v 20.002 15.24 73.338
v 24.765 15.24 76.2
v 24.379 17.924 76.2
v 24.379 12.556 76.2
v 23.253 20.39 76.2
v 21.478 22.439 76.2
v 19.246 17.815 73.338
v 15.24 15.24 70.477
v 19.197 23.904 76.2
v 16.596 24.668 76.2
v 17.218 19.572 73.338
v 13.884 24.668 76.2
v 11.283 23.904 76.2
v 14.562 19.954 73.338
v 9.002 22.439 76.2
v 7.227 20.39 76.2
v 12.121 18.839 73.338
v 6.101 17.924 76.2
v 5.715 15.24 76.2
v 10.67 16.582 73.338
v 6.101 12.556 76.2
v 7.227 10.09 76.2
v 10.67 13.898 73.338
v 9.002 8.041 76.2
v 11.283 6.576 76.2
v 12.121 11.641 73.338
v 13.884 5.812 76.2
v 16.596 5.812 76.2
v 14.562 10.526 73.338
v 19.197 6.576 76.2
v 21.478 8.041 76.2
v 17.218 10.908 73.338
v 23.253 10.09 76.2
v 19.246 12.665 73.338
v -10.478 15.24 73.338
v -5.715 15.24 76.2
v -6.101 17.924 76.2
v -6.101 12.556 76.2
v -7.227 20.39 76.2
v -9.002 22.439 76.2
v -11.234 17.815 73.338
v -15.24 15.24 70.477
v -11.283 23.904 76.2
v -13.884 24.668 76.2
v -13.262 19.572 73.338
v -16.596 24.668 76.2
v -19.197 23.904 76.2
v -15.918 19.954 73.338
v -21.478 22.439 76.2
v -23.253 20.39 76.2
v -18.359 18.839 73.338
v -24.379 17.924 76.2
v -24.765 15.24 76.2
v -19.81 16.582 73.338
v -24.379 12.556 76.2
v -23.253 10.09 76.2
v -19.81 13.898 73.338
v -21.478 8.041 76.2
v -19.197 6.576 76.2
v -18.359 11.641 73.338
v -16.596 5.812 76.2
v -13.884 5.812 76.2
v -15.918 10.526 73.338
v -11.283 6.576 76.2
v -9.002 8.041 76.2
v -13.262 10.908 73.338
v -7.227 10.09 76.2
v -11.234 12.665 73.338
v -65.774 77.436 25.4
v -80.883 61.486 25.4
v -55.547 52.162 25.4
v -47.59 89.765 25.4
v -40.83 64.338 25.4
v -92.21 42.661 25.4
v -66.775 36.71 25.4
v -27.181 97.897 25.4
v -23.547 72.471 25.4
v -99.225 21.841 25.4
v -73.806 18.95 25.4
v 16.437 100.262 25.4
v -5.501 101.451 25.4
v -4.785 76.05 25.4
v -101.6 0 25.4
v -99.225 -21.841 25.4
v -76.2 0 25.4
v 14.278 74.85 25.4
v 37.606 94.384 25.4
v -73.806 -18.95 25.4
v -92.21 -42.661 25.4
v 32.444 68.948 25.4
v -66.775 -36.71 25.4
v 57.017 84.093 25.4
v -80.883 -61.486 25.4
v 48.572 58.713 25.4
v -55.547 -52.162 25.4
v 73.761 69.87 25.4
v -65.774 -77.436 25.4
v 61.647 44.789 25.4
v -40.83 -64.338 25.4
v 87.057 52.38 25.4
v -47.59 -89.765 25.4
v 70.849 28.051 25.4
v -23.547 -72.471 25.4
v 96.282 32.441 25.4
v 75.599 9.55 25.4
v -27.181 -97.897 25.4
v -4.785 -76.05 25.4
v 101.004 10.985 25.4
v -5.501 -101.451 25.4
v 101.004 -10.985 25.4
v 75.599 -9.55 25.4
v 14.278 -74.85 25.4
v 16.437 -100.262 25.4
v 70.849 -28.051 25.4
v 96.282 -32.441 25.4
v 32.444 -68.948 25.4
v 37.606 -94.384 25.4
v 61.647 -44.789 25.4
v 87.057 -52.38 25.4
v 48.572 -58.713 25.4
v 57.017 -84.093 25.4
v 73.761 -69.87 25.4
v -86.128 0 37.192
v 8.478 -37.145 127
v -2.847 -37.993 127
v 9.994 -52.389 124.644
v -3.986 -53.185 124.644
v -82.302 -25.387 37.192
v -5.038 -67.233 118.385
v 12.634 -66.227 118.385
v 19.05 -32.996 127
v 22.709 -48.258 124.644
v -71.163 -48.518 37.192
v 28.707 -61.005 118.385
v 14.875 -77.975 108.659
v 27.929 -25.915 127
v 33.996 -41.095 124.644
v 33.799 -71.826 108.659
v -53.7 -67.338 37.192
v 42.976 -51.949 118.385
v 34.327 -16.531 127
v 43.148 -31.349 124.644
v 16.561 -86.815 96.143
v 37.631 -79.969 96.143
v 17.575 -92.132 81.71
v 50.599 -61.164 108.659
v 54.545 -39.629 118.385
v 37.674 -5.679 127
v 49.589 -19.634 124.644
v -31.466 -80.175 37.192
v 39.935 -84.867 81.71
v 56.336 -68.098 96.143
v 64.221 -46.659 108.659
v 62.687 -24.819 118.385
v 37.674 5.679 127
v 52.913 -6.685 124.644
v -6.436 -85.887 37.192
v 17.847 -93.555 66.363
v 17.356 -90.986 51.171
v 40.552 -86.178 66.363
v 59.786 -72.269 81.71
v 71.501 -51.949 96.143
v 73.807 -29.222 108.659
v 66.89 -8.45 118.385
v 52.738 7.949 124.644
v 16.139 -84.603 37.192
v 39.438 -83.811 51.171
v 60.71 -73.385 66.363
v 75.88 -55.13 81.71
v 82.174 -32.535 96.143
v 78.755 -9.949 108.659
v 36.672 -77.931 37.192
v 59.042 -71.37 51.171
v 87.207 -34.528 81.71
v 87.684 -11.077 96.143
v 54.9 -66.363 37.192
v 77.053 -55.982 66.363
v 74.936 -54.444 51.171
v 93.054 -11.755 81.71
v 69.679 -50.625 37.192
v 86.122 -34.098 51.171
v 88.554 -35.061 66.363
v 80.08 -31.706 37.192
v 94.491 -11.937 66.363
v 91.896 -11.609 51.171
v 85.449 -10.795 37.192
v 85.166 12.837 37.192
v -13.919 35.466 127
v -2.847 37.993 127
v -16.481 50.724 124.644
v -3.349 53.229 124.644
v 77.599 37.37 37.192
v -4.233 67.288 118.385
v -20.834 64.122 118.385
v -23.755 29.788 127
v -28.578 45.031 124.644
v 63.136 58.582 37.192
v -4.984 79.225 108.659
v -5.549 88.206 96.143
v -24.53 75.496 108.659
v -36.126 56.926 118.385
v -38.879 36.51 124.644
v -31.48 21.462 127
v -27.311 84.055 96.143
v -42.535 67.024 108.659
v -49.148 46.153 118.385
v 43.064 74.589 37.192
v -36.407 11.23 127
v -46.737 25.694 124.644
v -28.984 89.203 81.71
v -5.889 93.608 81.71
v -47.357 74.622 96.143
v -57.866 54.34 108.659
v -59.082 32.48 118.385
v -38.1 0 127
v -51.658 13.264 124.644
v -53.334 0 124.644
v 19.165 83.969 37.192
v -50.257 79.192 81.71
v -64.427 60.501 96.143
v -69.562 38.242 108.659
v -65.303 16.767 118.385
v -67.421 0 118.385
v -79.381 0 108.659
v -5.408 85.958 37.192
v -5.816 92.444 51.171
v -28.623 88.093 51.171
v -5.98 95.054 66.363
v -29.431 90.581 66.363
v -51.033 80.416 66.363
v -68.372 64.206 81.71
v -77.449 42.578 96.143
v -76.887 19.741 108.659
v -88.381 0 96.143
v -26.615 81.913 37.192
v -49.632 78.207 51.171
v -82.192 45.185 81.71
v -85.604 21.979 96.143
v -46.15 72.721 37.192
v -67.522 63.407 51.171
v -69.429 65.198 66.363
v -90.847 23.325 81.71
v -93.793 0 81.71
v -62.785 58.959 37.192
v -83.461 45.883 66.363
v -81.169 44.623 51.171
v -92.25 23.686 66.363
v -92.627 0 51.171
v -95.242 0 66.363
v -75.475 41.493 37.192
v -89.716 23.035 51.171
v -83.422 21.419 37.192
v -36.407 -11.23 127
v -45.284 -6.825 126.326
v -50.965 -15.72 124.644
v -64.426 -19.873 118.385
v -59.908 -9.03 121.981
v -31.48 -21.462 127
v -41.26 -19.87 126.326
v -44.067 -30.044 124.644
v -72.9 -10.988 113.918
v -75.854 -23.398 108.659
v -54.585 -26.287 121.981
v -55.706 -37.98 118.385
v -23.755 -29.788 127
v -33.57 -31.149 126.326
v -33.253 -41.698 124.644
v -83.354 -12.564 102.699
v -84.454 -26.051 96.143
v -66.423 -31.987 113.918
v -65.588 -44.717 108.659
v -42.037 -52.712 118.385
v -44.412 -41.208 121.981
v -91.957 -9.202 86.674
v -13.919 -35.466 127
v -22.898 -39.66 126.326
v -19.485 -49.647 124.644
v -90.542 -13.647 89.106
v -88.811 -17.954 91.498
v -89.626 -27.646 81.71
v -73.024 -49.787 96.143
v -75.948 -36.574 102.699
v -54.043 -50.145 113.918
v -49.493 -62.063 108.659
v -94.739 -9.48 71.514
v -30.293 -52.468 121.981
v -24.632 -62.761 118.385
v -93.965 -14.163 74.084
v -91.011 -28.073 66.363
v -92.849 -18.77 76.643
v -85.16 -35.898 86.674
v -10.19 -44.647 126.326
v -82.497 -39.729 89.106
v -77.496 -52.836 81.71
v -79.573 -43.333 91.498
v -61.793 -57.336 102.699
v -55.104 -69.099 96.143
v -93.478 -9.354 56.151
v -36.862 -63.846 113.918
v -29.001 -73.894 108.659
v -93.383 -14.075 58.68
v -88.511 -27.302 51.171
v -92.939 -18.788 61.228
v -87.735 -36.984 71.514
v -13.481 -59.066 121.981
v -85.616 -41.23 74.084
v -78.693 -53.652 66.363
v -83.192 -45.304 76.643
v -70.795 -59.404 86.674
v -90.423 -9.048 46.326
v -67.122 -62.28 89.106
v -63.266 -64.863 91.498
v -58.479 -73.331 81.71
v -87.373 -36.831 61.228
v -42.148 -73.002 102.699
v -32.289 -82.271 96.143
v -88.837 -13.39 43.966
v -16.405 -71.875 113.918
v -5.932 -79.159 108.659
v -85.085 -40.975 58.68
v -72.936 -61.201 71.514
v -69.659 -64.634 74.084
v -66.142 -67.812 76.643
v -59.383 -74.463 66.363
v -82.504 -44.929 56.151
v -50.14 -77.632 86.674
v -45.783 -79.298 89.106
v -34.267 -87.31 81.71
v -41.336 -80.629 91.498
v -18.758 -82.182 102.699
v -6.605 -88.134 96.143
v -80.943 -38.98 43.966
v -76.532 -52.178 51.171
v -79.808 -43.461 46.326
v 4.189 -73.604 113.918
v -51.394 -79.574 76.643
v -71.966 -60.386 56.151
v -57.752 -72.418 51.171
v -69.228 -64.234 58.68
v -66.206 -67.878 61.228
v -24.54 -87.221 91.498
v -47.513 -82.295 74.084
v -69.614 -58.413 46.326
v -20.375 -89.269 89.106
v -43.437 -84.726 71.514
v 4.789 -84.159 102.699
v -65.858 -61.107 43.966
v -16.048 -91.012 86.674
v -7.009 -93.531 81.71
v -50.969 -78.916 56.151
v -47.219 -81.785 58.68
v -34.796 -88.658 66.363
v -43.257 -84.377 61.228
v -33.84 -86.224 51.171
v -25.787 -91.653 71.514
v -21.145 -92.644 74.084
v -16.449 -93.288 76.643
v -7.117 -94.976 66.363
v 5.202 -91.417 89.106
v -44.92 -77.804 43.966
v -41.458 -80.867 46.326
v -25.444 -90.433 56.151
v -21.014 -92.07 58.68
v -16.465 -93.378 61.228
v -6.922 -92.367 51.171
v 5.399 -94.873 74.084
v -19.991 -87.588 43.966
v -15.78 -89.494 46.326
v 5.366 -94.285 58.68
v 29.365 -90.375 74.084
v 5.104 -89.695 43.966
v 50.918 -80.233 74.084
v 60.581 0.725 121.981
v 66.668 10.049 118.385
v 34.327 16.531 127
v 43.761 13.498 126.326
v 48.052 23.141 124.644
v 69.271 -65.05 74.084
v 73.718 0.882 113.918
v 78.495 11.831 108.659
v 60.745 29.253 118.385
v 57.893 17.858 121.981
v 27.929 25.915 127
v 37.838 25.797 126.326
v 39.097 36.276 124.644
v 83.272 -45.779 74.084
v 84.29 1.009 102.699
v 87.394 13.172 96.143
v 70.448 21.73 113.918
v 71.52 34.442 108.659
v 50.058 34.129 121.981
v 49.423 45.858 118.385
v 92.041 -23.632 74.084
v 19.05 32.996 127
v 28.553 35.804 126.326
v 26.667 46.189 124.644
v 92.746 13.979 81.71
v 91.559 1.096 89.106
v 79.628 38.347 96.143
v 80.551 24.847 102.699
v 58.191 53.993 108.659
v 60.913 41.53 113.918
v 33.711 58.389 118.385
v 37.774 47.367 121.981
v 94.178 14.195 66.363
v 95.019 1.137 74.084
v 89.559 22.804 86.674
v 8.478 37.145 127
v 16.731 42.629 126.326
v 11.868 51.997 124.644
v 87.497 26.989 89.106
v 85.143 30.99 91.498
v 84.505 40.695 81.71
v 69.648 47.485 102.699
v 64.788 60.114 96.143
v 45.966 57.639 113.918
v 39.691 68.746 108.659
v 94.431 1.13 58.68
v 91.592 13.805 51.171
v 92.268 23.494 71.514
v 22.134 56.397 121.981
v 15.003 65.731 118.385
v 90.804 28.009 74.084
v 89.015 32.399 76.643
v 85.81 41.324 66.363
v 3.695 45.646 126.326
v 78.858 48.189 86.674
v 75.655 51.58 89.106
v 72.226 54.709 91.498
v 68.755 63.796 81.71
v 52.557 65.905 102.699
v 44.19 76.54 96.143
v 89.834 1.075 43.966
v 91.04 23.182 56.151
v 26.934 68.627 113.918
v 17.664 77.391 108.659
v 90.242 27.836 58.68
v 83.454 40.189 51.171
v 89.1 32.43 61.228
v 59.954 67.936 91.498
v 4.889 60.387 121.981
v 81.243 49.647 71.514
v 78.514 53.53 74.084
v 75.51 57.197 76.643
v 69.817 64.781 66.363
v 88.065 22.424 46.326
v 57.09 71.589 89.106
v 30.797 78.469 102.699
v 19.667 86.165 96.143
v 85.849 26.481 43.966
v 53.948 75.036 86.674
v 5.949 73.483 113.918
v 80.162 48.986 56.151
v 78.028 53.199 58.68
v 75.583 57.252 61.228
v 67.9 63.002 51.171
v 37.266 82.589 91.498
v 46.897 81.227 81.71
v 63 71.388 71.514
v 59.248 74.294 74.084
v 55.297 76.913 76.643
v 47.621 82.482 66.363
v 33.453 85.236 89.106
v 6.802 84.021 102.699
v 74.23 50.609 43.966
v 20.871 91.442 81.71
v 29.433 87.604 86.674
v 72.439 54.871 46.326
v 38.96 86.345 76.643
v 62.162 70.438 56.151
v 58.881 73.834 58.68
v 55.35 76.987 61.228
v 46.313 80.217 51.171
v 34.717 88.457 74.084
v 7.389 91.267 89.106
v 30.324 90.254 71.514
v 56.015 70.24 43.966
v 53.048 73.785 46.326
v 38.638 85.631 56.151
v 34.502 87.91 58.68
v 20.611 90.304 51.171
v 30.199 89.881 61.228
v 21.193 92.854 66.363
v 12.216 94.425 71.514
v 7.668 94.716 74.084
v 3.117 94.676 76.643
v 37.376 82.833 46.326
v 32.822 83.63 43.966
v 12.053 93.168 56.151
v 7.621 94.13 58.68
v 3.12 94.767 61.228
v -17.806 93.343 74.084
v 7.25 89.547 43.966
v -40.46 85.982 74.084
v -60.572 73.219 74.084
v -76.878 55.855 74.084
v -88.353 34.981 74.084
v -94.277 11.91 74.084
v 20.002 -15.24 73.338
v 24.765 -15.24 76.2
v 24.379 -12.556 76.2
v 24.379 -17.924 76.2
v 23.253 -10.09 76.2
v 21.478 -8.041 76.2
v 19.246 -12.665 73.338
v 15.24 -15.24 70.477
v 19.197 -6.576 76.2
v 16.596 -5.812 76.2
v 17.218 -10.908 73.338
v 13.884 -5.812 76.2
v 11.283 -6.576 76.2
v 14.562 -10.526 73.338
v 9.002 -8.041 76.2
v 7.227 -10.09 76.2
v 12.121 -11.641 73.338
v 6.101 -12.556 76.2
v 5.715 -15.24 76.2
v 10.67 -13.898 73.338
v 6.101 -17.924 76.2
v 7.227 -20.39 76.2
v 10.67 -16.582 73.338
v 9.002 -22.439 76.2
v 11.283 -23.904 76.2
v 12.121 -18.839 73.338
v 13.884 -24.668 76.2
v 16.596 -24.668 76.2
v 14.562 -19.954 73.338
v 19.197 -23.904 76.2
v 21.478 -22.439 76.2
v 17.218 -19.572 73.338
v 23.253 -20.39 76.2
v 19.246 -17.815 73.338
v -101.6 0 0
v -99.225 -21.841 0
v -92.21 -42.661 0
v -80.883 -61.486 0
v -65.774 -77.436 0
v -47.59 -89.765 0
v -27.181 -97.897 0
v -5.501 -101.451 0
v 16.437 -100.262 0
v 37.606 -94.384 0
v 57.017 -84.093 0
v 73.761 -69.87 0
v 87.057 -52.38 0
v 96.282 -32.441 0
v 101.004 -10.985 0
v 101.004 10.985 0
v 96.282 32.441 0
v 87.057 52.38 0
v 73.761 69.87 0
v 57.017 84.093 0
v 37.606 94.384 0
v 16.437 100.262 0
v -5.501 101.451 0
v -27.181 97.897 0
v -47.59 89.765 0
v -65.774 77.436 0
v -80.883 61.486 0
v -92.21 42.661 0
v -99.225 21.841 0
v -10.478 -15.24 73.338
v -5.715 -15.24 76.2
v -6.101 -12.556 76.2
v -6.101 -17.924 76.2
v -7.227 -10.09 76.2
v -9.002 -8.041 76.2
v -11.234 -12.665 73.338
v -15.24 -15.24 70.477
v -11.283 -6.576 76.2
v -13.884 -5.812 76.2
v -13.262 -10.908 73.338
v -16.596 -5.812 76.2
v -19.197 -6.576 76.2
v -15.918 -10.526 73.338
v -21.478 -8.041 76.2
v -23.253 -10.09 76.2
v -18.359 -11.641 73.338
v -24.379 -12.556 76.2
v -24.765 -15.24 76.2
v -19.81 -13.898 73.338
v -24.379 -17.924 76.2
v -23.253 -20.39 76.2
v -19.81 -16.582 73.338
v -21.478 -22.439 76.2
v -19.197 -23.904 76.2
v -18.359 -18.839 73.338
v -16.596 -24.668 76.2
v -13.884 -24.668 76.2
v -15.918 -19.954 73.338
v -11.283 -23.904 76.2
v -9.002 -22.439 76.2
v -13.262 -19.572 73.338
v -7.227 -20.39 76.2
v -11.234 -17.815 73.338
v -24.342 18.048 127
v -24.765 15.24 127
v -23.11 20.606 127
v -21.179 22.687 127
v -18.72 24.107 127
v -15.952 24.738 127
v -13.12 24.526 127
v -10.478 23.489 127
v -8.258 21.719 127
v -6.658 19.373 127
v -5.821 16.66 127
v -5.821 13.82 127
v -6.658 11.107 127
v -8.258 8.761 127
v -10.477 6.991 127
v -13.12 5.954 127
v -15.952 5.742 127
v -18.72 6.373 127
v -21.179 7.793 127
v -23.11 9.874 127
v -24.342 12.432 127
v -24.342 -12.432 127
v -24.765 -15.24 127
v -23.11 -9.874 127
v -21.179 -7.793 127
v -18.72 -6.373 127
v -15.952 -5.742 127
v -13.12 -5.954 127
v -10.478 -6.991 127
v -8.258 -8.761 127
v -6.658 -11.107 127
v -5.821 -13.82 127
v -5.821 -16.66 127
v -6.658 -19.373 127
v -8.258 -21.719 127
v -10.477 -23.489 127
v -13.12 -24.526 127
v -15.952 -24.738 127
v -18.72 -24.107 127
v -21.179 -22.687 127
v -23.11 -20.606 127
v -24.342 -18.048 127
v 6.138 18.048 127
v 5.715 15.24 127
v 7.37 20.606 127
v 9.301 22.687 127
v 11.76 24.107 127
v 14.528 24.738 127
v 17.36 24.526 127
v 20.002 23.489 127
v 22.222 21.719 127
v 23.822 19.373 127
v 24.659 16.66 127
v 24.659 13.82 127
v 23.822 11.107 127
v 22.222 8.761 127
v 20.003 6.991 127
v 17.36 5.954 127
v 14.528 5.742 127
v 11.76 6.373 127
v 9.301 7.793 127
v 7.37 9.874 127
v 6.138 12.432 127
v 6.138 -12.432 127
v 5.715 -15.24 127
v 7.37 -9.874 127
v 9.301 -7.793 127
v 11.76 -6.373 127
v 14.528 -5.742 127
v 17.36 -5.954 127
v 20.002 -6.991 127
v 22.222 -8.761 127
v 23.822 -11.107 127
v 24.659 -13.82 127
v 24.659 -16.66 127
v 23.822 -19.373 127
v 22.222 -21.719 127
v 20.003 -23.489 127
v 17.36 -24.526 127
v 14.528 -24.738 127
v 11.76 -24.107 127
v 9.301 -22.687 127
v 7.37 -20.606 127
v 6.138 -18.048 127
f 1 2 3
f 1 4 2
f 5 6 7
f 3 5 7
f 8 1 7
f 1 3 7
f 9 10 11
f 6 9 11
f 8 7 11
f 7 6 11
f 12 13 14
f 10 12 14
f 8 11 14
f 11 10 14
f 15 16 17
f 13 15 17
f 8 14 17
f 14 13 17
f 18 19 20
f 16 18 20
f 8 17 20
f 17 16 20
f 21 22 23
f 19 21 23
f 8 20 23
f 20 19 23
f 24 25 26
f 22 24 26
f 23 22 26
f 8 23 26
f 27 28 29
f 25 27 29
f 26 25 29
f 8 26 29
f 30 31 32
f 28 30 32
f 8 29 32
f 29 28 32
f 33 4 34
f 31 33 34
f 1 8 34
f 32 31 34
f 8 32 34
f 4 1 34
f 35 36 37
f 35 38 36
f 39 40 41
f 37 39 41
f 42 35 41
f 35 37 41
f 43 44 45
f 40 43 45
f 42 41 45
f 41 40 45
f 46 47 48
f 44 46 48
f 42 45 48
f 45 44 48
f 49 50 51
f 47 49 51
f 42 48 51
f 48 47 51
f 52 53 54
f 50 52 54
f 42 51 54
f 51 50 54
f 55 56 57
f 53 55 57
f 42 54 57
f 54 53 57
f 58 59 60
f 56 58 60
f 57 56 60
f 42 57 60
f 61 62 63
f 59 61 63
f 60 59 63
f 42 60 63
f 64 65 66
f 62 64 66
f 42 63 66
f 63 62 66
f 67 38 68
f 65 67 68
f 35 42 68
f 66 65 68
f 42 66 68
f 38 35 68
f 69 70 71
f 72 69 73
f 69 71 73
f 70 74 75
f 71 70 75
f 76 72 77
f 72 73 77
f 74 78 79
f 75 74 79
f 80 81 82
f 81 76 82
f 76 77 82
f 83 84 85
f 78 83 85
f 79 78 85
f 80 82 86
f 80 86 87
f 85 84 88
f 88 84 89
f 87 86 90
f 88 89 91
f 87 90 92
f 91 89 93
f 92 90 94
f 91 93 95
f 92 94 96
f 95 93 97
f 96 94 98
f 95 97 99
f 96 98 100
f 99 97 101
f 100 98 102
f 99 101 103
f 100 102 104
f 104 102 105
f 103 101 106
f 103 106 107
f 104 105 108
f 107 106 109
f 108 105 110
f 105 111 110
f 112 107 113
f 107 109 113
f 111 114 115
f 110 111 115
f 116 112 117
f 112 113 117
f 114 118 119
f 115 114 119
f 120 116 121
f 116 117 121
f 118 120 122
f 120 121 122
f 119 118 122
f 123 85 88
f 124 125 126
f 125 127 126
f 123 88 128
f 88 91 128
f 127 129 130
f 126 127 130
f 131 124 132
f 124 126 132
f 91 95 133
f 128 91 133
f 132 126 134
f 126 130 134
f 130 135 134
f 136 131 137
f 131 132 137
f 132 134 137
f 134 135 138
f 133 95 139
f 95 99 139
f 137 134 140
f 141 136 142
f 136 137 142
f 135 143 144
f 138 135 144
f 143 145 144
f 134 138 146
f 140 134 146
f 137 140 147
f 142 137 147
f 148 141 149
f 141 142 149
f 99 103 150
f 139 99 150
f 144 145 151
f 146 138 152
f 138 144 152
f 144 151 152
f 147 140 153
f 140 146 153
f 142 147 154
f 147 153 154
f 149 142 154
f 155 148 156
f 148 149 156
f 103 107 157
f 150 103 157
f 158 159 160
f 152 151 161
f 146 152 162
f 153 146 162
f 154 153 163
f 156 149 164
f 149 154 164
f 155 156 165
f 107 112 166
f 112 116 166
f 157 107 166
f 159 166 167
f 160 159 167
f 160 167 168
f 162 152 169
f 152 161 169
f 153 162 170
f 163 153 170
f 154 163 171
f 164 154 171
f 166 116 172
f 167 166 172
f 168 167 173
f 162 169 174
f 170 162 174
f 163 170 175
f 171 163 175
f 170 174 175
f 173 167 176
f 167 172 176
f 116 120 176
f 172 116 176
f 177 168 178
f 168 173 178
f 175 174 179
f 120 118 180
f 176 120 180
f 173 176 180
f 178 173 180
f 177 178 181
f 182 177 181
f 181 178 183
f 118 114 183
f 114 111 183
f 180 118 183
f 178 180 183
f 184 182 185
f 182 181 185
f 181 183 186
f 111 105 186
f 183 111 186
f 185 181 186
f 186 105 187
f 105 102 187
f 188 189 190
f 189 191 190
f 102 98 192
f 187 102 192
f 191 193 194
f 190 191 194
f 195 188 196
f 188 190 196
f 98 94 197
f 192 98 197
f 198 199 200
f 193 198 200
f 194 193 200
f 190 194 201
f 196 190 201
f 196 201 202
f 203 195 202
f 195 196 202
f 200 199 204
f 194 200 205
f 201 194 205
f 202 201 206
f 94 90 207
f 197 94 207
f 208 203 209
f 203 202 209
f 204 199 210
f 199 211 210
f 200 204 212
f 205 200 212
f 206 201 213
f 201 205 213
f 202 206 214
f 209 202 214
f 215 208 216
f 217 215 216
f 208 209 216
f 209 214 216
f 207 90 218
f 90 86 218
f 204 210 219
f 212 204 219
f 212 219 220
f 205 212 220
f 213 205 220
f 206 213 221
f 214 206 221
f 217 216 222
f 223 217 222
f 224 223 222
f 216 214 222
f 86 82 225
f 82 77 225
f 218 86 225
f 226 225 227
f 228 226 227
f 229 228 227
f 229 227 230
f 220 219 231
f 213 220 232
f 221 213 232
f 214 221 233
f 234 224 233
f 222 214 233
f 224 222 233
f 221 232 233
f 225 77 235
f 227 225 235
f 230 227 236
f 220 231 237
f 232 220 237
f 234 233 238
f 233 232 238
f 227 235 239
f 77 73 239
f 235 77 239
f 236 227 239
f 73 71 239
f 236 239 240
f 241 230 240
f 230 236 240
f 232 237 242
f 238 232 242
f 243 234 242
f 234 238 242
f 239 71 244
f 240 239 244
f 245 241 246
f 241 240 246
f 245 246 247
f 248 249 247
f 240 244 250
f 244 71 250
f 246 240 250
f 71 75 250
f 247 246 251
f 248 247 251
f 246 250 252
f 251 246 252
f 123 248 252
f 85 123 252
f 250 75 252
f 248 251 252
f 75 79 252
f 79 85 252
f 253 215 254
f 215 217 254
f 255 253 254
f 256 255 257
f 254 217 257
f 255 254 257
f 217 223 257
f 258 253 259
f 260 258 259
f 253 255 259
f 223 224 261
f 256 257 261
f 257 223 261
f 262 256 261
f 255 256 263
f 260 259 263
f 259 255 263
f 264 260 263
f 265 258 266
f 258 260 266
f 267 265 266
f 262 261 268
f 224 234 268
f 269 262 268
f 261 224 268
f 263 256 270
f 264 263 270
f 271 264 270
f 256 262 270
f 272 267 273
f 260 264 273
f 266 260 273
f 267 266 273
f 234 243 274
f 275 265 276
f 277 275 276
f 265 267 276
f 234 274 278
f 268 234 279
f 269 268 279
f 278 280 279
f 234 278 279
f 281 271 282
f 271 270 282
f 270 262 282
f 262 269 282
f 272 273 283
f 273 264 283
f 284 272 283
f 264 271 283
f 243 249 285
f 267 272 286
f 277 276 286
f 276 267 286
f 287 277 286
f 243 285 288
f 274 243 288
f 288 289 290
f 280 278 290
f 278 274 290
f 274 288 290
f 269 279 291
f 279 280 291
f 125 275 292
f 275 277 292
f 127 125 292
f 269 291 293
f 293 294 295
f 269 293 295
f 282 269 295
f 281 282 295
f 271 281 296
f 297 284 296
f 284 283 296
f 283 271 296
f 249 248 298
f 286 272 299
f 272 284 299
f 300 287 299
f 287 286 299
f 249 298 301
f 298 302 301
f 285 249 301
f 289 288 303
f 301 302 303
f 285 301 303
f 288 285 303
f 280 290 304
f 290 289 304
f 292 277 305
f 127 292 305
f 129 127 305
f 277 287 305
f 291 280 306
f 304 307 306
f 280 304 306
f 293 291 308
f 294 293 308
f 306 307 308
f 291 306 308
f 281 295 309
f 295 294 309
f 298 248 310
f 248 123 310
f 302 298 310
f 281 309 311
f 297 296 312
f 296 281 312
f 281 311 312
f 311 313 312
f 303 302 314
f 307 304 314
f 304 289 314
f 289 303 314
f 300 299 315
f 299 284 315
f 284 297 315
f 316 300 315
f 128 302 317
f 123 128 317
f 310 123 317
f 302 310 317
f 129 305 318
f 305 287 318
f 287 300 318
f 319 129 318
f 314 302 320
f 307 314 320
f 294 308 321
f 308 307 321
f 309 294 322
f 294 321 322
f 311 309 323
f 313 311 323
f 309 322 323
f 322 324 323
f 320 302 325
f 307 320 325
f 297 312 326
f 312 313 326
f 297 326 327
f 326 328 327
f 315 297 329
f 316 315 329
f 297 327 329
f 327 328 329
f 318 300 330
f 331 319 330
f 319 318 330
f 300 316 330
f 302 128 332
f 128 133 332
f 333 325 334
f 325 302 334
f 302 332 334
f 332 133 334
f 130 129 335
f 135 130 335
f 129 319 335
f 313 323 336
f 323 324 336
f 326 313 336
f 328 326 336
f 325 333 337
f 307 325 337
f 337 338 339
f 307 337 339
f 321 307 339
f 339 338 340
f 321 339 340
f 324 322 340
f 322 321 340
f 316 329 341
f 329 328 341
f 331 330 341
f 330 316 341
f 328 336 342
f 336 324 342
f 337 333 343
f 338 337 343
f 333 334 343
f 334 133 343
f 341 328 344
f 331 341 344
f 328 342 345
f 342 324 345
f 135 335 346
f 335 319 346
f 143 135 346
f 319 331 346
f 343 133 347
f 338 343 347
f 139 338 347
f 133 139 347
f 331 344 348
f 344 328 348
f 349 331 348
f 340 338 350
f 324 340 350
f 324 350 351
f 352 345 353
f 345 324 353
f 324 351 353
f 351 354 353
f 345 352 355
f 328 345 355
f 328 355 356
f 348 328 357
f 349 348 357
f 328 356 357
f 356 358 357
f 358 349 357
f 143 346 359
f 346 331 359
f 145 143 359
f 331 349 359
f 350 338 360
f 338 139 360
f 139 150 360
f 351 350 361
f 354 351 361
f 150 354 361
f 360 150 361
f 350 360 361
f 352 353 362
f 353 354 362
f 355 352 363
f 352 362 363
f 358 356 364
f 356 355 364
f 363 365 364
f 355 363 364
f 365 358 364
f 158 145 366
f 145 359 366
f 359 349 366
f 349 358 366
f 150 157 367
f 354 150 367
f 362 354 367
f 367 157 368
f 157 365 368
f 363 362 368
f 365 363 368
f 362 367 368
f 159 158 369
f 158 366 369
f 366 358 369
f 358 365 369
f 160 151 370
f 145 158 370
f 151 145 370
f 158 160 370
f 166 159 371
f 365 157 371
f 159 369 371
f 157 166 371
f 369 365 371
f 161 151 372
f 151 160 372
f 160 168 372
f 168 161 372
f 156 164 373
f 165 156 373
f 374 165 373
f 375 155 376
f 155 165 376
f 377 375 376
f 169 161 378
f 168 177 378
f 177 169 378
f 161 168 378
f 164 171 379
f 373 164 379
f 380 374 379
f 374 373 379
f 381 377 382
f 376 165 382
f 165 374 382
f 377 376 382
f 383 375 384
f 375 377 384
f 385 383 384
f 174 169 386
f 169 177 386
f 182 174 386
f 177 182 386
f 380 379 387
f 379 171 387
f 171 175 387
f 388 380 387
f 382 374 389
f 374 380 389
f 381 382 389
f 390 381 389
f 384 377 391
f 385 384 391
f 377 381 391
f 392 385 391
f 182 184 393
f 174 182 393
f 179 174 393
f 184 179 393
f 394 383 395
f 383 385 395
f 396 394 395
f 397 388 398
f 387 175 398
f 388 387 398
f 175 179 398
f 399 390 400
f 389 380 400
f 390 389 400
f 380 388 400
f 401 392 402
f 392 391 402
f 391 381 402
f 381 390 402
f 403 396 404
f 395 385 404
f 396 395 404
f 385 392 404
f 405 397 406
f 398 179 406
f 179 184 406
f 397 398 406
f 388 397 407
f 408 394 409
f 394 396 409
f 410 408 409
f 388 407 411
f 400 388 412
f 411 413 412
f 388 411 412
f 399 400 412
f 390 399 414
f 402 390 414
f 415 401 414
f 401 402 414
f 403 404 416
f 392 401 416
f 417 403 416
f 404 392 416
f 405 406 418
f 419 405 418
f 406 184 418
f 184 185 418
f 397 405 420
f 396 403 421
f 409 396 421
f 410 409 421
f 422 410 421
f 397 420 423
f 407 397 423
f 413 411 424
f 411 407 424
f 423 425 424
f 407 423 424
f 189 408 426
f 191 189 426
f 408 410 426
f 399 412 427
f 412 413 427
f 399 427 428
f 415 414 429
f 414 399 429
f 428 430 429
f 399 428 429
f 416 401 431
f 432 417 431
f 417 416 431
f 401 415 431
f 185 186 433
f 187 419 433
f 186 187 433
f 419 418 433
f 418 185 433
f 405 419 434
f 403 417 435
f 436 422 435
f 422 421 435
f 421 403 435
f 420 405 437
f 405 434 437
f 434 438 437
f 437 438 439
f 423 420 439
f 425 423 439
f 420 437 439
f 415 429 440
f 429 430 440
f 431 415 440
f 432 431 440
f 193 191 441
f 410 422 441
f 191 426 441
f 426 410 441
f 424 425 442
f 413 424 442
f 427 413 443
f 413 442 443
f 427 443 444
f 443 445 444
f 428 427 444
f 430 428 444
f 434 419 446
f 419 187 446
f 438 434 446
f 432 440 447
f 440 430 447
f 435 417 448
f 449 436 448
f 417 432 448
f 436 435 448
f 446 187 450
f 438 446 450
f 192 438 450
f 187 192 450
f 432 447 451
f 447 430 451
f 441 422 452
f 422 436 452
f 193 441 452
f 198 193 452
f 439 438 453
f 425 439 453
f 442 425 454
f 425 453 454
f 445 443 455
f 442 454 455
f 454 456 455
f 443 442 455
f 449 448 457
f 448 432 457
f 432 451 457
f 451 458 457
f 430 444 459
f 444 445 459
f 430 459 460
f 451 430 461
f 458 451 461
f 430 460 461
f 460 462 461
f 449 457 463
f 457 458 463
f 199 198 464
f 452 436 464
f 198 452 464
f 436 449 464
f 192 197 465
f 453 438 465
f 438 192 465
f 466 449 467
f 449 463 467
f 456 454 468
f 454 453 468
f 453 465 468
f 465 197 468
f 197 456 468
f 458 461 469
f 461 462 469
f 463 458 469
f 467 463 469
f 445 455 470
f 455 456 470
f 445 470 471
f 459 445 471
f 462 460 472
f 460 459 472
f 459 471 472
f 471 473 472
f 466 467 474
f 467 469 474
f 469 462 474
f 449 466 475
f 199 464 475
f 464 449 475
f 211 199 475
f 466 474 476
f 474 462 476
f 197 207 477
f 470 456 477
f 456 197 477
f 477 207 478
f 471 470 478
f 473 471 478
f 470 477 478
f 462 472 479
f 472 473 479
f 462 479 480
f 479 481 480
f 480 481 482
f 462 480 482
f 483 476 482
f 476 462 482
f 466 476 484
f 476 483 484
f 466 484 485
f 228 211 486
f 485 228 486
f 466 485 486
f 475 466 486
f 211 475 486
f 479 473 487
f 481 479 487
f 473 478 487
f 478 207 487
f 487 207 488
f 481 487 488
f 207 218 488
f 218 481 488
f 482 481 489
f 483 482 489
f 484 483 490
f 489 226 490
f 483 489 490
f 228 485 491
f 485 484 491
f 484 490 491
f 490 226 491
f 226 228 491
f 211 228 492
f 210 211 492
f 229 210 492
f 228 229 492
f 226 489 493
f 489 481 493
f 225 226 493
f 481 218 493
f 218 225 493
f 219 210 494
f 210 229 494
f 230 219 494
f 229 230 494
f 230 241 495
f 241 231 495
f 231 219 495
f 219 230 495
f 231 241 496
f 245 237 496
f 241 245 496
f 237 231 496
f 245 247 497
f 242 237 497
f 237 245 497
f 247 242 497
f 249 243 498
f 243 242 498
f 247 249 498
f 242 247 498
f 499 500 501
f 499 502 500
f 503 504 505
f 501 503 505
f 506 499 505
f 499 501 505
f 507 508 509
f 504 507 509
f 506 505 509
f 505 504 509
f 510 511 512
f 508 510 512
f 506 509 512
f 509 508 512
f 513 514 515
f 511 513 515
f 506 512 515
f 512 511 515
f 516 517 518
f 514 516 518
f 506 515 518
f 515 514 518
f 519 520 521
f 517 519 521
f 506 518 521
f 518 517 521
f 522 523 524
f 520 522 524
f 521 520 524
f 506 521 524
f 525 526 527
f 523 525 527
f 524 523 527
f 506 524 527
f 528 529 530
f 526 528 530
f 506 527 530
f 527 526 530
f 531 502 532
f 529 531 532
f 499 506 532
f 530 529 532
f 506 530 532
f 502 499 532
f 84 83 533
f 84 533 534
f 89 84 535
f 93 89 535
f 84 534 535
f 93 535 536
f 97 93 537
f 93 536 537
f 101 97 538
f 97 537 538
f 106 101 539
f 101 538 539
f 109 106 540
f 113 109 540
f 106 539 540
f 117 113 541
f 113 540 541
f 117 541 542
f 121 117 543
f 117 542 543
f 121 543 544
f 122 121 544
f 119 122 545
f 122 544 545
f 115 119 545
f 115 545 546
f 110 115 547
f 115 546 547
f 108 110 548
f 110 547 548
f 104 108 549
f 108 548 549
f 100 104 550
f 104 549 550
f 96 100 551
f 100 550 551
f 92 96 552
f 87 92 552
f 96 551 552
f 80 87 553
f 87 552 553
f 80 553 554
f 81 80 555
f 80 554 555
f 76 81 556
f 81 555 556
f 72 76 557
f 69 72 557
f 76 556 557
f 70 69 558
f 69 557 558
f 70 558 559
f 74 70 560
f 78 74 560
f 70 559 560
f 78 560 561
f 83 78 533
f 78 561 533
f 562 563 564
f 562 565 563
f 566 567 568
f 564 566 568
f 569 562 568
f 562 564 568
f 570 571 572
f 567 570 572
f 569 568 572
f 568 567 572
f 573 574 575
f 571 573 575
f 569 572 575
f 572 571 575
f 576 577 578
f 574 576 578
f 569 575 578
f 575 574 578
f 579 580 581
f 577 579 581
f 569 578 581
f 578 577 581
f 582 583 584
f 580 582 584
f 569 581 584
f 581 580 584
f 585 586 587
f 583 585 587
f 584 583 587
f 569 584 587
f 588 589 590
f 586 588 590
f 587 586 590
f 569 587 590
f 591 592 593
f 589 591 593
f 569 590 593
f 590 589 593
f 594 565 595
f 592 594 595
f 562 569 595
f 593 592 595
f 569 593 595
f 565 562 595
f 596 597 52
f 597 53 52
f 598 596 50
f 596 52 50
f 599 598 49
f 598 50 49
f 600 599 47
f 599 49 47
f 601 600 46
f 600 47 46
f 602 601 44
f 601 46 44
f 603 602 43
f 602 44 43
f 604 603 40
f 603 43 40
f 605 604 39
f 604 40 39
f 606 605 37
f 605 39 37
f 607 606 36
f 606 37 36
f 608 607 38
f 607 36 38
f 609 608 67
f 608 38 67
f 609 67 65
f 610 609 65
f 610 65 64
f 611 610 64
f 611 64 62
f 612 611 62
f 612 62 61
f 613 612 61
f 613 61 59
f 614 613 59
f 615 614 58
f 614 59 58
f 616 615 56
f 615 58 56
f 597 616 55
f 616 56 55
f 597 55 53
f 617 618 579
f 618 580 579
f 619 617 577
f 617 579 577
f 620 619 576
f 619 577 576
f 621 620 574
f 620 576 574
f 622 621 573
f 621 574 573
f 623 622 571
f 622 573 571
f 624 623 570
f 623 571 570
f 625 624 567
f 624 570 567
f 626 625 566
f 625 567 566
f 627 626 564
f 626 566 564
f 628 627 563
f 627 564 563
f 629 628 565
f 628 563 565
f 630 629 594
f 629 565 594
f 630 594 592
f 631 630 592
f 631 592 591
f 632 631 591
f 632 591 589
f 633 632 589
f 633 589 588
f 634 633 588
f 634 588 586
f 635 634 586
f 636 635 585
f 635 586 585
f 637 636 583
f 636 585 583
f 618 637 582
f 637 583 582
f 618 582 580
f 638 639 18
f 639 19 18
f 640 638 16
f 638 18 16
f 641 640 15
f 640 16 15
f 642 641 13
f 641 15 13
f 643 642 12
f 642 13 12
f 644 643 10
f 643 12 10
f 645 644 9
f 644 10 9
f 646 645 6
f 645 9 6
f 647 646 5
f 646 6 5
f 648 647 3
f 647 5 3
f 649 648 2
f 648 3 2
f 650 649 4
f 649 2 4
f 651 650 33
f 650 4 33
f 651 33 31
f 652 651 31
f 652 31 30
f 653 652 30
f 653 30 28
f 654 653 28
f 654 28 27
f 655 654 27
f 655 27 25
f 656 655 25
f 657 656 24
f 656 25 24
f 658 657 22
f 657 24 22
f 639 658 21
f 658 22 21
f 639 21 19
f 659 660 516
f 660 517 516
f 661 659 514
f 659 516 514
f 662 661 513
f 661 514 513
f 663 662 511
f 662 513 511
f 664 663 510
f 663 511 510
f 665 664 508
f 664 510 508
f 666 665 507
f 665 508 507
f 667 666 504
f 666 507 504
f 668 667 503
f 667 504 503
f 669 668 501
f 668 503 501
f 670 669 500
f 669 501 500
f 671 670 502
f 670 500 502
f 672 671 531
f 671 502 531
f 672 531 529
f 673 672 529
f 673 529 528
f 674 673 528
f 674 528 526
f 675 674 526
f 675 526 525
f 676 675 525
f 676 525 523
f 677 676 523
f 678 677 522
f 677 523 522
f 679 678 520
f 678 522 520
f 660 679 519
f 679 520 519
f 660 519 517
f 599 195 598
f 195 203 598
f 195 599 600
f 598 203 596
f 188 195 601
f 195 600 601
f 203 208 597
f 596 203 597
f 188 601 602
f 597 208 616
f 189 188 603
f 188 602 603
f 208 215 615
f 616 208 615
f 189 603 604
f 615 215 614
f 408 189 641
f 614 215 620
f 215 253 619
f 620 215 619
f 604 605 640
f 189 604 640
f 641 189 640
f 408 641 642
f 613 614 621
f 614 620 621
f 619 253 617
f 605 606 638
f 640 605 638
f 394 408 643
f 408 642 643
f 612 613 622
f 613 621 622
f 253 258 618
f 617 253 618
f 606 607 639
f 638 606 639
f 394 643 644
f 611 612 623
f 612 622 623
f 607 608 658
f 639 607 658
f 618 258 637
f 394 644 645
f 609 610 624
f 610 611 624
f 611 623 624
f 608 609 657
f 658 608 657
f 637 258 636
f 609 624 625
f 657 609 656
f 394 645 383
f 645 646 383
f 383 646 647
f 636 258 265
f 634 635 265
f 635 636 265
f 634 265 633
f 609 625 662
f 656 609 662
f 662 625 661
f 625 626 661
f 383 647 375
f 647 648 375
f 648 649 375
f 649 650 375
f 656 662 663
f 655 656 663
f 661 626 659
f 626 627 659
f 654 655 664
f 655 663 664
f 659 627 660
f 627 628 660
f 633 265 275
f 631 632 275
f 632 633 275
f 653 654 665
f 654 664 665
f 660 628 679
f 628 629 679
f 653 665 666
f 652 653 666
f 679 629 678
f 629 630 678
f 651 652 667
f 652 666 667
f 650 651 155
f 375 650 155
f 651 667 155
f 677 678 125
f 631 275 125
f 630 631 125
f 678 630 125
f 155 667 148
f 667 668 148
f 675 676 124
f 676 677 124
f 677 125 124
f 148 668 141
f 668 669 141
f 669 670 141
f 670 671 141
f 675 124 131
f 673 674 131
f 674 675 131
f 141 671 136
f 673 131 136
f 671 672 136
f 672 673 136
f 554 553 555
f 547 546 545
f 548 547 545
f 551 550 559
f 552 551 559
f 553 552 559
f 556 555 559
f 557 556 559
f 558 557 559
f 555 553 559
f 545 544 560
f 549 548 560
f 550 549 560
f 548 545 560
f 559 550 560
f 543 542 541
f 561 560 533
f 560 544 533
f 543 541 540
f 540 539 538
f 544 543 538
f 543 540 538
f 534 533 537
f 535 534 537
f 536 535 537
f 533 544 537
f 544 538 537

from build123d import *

# Parameters (mm, degrees)
F3_D     = 19.05
F3_DEPTH = 50.8
F3_TIP   = 5.7231973962


with BuildPart() as f1:
    # F0 (on Front) → F1 (revolve)
    with BuildSketch(Plane.XZ):
        with BuildLine():
            Line((-101.6, 0), (0, 0))
            Line((0, 0), (0, 127))
            Line((0, 127), (-38.1, 127))
            ThreePointArc((-38.1, 127), (-91.5651749151, 89.1056905932), (-76.2, 25.4))
            Line((-76.2, 25.4), (-101.6, 25.4))
            Line((-101.6, 25.4), (-101.6, 0))
        make_face()
    revolve(axis=Axis((0, 0, 63.5), (0, 0, 1)))

    # F3
    with Locations(Plane.XY.offset(127)):
        with Locations((-15.24, 15.24), (15.24, 15.24), (15.24, -15.24), (-15.24, -15.24)):
            Hole(F3_D / 2, depth=F3_DEPTH)
            with Locations((0, 0, -(F3_DEPTH + F3_TIP / 2))):  # 118° drill point
                Cone(0, F3_D / 2, F3_TIP, mode=Mode.SUBTRACT)


solid = f1.part
